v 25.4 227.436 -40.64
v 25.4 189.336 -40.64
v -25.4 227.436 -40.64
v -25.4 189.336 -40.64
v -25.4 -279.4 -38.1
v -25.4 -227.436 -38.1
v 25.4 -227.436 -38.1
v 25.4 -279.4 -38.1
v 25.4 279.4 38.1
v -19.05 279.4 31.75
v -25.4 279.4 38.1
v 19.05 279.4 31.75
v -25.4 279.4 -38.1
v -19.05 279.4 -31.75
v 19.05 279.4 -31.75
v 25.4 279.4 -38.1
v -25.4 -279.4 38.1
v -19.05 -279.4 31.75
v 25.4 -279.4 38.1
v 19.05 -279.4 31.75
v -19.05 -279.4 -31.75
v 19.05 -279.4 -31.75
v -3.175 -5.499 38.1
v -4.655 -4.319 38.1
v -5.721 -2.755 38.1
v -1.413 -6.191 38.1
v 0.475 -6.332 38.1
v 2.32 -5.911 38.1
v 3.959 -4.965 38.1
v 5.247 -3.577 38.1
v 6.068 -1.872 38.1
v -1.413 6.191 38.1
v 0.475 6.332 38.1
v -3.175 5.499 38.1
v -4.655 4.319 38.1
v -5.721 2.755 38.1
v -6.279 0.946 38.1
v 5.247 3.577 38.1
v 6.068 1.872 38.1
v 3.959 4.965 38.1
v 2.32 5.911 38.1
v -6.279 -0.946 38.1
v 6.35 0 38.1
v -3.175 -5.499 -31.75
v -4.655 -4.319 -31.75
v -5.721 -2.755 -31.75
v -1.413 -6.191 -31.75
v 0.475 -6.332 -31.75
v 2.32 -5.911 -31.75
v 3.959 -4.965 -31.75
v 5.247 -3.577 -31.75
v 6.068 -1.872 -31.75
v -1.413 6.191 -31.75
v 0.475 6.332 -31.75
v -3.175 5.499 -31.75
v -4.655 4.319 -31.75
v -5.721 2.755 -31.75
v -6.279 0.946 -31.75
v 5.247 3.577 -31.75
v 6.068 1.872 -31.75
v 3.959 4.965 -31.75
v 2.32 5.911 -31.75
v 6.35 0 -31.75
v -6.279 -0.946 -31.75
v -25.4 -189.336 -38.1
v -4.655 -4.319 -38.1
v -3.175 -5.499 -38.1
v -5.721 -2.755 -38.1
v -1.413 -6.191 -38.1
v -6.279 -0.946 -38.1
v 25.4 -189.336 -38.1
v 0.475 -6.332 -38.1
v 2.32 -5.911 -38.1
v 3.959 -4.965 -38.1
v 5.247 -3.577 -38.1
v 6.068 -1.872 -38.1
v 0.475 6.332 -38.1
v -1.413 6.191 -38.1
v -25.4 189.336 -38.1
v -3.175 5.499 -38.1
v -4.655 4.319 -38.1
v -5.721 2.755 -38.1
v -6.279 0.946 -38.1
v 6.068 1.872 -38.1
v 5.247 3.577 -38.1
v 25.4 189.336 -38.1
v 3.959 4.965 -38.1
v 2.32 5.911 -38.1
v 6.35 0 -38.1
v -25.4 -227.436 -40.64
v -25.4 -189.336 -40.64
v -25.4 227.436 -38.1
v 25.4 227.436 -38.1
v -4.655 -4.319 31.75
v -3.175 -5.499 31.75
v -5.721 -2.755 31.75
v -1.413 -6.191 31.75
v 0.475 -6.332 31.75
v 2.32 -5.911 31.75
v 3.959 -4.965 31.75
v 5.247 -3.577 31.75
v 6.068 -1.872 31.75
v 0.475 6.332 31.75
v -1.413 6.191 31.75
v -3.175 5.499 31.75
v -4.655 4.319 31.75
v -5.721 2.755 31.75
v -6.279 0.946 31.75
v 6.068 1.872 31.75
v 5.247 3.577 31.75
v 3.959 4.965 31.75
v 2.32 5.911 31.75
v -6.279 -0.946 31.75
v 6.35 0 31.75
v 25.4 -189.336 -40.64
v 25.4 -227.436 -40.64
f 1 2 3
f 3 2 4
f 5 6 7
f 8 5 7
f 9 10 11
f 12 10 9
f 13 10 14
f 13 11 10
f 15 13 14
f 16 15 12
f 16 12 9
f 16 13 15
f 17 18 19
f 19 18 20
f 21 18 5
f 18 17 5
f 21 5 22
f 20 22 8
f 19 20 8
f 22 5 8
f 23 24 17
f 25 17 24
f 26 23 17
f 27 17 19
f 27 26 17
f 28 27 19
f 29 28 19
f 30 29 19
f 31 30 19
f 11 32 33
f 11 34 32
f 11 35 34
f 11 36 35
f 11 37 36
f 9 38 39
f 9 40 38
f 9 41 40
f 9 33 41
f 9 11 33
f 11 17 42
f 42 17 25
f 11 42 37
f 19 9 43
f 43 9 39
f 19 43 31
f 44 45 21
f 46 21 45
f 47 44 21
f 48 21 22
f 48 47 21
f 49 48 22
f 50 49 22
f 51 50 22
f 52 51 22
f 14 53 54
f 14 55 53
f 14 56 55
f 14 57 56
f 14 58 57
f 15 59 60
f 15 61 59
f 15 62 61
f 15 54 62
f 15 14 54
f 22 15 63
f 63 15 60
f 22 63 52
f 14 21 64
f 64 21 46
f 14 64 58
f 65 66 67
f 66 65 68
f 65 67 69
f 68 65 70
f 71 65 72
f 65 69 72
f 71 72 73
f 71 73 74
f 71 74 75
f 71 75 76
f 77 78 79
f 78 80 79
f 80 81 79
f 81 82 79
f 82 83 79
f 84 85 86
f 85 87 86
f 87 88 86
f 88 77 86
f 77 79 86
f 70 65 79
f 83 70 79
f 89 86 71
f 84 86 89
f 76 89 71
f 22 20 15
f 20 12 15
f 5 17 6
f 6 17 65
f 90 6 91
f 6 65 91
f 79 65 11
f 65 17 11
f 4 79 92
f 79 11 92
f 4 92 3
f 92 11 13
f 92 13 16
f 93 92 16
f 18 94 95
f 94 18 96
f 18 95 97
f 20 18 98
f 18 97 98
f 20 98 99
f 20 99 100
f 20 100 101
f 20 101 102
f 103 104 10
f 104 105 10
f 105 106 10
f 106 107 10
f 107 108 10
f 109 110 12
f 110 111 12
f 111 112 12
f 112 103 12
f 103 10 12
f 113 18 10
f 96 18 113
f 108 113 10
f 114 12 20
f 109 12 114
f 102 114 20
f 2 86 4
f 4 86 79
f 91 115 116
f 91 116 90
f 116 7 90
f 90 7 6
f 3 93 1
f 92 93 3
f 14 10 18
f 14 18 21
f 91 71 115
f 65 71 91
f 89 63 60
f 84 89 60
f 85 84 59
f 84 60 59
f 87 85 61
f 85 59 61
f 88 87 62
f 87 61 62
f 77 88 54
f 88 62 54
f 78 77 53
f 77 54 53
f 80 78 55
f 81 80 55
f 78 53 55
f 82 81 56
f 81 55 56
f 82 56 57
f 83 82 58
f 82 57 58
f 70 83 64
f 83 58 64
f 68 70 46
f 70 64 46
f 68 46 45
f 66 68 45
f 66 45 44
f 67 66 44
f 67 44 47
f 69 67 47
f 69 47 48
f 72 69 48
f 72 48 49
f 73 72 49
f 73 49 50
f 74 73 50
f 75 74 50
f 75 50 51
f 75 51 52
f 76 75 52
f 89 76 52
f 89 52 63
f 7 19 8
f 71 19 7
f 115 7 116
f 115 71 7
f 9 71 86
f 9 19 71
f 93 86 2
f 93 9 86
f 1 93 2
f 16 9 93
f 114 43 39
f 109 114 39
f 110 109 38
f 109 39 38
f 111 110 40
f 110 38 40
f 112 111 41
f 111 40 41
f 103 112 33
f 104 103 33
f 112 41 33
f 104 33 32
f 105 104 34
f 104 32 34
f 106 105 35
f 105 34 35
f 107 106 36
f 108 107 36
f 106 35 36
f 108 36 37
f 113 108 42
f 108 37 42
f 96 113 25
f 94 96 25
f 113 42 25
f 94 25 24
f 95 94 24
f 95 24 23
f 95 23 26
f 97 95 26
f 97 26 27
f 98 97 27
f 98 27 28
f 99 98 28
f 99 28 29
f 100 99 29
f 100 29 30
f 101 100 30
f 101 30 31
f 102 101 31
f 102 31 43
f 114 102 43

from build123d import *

# Parameters (mm, degrees)
SKETCH1_W           = 50.8
SKETCH1_H           = 76.2
SKETCH1_W_2         = 38.1
SKETCH1_H_2         = 63.5
BOSS_EXTRUDE1_DEPTH = 279.4
SKETCH2_R           = 6.35
CUT_EXTRUDE1_DEPTH  = 77.2
SKETCH3_W           = 50.8
SKETCH3_H           = 38.1
BOSS_EXTRUDE2_DEPTH = 2.54


with BuildPart() as part:
    # Sketch1 → Boss-Extrude1 (new body, symmetric)
    with BuildSketch(Plane(origin=(0, 0, 0), x_dir=(1, 0, 0), z_dir=(0, 1, 0))):
        Rectangle(SKETCH1_W, SKETCH1_H)
        Rectangle(SKETCH1_W_2, SKETCH1_H_2, mode=Mode.SUBTRACT)
    extrude(amount=BOSS_EXTRUDE1_DEPTH, both=True)

    # Sketch2 → Cut-Extrude1 (cut, through all)
    with BuildSketch(Plane.XY.offset(38.1)):
        Circle(SKETCH2_R)
    extrude(amount=-CUT_EXTRUDE1_DEPTH, mode=Mode.SUBTRACT)

    # Sketch3 → Boss-Extrude2 (add)
    with BuildSketch(Plane(origin=(0, 0, -38.1), x_dir=(-1, 0, 0), z_dir=(0, 0, -1))):
        with Locations((0, -208.386065816)):
            Rectangle(SKETCH3_W, SKETCH3_H)
    boss_extrude2 = extrude(amount=BOSS_EXTRUDE2_DEPTH)

    # Mirror1: Boss-Extrude2 across plane
    add(boss_extrude2.mirror(Plane.ZX))


solid = part.part
